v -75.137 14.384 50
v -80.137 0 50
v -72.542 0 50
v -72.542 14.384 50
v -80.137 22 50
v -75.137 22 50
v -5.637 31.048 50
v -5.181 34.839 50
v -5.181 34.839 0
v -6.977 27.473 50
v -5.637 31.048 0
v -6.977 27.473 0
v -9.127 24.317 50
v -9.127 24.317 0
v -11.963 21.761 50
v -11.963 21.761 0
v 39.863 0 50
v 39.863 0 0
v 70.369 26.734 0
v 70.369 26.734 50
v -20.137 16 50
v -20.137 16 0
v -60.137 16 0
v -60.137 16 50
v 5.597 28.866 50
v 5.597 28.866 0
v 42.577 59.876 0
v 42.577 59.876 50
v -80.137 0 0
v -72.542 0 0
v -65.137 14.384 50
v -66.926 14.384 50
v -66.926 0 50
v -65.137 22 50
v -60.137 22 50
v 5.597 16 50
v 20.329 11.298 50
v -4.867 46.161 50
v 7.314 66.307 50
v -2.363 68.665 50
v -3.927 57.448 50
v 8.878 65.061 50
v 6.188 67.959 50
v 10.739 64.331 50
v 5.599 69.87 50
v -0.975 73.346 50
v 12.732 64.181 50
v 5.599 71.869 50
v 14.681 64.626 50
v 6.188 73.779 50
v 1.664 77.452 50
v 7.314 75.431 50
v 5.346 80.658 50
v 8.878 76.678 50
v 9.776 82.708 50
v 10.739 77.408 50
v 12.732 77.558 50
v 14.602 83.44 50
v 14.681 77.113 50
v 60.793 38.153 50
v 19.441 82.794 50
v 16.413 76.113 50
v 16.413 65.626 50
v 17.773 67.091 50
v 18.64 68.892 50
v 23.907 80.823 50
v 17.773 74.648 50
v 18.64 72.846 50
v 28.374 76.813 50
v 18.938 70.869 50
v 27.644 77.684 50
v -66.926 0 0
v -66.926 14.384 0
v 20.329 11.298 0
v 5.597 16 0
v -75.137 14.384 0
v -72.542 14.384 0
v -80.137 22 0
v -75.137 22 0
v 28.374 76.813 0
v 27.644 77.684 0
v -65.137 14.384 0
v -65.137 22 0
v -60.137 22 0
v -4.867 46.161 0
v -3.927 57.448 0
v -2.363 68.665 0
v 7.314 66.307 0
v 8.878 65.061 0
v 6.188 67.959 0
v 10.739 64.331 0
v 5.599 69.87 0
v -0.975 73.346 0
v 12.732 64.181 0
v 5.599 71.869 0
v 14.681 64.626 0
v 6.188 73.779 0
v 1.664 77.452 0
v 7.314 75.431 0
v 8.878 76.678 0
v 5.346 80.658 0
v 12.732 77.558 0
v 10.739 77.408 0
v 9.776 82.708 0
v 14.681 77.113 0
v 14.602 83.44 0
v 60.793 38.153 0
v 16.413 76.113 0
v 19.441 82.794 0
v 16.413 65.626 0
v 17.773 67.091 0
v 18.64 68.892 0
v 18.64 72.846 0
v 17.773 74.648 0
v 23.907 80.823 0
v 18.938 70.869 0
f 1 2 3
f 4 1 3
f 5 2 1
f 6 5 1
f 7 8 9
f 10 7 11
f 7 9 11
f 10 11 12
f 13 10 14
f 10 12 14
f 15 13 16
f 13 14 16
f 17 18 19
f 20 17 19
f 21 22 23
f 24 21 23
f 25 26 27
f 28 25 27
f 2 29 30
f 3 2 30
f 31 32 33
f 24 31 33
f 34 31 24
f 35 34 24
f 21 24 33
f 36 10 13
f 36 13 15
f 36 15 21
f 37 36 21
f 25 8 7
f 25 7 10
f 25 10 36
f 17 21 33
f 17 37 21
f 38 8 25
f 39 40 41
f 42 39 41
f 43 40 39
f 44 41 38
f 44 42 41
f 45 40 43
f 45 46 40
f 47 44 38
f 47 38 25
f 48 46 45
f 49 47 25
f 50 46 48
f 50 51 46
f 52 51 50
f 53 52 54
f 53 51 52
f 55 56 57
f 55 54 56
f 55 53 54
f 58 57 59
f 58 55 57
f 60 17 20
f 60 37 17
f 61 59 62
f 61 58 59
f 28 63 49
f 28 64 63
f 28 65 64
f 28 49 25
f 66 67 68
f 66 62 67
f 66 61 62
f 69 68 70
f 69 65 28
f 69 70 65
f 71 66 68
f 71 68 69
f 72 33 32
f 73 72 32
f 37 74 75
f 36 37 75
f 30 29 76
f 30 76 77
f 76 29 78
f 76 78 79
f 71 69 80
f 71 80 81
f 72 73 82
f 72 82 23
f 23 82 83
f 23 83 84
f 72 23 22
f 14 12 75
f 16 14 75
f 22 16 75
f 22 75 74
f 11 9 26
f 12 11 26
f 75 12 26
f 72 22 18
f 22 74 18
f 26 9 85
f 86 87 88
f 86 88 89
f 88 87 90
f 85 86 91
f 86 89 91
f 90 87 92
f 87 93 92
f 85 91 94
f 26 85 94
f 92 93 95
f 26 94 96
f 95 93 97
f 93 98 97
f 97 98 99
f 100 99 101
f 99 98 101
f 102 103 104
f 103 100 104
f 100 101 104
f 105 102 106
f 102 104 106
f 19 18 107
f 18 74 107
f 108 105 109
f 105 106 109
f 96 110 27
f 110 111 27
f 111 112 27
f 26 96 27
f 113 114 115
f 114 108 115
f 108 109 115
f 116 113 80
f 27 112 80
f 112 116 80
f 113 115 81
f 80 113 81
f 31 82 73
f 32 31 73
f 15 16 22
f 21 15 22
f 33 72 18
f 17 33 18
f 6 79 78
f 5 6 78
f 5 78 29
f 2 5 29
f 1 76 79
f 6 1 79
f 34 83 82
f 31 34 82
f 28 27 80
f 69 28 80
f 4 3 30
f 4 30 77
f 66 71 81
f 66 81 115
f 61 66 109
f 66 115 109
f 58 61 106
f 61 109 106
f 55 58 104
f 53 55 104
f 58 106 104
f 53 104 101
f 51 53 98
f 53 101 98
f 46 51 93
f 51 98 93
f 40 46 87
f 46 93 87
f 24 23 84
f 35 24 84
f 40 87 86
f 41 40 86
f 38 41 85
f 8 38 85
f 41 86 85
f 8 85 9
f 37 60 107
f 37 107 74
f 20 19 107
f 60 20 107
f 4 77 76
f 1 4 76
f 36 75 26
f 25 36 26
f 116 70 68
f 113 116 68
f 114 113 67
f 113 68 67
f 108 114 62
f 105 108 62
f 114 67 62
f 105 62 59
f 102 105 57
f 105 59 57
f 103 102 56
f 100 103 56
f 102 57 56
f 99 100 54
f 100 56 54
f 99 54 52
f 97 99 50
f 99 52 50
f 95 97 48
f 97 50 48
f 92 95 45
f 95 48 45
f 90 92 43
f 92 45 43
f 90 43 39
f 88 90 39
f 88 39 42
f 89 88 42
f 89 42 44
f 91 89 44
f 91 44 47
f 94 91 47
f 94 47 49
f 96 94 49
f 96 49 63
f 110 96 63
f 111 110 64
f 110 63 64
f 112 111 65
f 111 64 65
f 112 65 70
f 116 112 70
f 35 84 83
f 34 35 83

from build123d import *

# Parameters (mm, degrees)
BOSS_EXTRUDE1_DEPTH = 50
SKETCH2_R           = 6.706955273
CUT_EXTRUDE1_DEPTH  = 50
SKETCH3_W           = 5.615900211
SKETCH3_H           = 17.85801338
CUT_EXTRUDE3_DEPTH  = 50


with BuildPart() as part:
    # Sketch1 → Boss-Extrude1 (new body)
    with BuildSketch(Plane.XY):
        with BuildLine():
            Line((-80.136986301, 22), (-80.136986301, 0))
            Line((-80.136986301, 0), (39.863013699, 0))
            Line((39.863013699, 0), (70.368770652, 26.734309258))
            Line((70.368770652, 26.734309258), (60.793116967, 38.153404294))
            Line((60.793116967, 38.153404294), (20.329079656, 11.29806257))
            Line((20.329079656, 11.29806257), (5.596910467, 16))
            Line((5.596910467, 16), (5.596910467, 28.866371282))
            Line((5.596910467, 28.866371282), (42.576894843, 59.876492709))
            Line((42.576894843, 59.876492709), (28.374143533, 76.813463522))
            Line((28.374143533, 76.813463522), (27.644448799, 77.683634248))
            ThreePointArc((27.644448799, 77.683634248), (9.775633658, 82.708091174), (-2.362906797, 68.665457606))
            ThreePointArc((-2.362906797, 68.665457606), (-4.475191094, 51.810848299), (-5.180910018, 34.839061104))
            ThreePointArc((-5.180910018, 34.839061104), (-6.977338503, 27.473020361), (-11.963229546, 21.761050295))
            Line((-11.963229546, 21.761050295), (-20.136986301, 16))
            Line((-20.136986301, 16), (-60.136986301, 16))
            Line((-60.136986301, 16), (-60.136986301, 22))
            Line((-60.136986301, 22), (-65.136986301, 22))
            Line((-65.136986301, 22), (-65.136986301, 14.383561644))
            Line((-65.136986301, 14.383561644), (-75.136986301, 14.383561644))
            Line((-75.136986301, 14.383561644), (-75.136986301, 22))
            Line((-75.136986301, 22), (-80.136986301, 22))
        make_face()
    extrude(amount=BOSS_EXTRUDE1_DEPTH)

    # Sketch2 → Cut-Extrude1 (cut)
    with BuildSketch(Plane.XY.offset(50)):
        with Locations((12.231016626, 70.8693701)):
            Circle(SKETCH2_R)
    extrude(amount=-CUT_EXTRUDE1_DEPTH, mode=Mode.SUBTRACT)

    # Sketch3 → Cut-Extrude3 (cut)
    with BuildSketch(Plane.XY.offset(50)):
        with Locations((-69.734384067, 5.454554954)):
            Rectangle(SKETCH3_W, SKETCH3_H)
    extrude(amount=-CUT_EXTRUDE3_DEPTH, mode=Mode.SUBTRACT)


solid = part.part
